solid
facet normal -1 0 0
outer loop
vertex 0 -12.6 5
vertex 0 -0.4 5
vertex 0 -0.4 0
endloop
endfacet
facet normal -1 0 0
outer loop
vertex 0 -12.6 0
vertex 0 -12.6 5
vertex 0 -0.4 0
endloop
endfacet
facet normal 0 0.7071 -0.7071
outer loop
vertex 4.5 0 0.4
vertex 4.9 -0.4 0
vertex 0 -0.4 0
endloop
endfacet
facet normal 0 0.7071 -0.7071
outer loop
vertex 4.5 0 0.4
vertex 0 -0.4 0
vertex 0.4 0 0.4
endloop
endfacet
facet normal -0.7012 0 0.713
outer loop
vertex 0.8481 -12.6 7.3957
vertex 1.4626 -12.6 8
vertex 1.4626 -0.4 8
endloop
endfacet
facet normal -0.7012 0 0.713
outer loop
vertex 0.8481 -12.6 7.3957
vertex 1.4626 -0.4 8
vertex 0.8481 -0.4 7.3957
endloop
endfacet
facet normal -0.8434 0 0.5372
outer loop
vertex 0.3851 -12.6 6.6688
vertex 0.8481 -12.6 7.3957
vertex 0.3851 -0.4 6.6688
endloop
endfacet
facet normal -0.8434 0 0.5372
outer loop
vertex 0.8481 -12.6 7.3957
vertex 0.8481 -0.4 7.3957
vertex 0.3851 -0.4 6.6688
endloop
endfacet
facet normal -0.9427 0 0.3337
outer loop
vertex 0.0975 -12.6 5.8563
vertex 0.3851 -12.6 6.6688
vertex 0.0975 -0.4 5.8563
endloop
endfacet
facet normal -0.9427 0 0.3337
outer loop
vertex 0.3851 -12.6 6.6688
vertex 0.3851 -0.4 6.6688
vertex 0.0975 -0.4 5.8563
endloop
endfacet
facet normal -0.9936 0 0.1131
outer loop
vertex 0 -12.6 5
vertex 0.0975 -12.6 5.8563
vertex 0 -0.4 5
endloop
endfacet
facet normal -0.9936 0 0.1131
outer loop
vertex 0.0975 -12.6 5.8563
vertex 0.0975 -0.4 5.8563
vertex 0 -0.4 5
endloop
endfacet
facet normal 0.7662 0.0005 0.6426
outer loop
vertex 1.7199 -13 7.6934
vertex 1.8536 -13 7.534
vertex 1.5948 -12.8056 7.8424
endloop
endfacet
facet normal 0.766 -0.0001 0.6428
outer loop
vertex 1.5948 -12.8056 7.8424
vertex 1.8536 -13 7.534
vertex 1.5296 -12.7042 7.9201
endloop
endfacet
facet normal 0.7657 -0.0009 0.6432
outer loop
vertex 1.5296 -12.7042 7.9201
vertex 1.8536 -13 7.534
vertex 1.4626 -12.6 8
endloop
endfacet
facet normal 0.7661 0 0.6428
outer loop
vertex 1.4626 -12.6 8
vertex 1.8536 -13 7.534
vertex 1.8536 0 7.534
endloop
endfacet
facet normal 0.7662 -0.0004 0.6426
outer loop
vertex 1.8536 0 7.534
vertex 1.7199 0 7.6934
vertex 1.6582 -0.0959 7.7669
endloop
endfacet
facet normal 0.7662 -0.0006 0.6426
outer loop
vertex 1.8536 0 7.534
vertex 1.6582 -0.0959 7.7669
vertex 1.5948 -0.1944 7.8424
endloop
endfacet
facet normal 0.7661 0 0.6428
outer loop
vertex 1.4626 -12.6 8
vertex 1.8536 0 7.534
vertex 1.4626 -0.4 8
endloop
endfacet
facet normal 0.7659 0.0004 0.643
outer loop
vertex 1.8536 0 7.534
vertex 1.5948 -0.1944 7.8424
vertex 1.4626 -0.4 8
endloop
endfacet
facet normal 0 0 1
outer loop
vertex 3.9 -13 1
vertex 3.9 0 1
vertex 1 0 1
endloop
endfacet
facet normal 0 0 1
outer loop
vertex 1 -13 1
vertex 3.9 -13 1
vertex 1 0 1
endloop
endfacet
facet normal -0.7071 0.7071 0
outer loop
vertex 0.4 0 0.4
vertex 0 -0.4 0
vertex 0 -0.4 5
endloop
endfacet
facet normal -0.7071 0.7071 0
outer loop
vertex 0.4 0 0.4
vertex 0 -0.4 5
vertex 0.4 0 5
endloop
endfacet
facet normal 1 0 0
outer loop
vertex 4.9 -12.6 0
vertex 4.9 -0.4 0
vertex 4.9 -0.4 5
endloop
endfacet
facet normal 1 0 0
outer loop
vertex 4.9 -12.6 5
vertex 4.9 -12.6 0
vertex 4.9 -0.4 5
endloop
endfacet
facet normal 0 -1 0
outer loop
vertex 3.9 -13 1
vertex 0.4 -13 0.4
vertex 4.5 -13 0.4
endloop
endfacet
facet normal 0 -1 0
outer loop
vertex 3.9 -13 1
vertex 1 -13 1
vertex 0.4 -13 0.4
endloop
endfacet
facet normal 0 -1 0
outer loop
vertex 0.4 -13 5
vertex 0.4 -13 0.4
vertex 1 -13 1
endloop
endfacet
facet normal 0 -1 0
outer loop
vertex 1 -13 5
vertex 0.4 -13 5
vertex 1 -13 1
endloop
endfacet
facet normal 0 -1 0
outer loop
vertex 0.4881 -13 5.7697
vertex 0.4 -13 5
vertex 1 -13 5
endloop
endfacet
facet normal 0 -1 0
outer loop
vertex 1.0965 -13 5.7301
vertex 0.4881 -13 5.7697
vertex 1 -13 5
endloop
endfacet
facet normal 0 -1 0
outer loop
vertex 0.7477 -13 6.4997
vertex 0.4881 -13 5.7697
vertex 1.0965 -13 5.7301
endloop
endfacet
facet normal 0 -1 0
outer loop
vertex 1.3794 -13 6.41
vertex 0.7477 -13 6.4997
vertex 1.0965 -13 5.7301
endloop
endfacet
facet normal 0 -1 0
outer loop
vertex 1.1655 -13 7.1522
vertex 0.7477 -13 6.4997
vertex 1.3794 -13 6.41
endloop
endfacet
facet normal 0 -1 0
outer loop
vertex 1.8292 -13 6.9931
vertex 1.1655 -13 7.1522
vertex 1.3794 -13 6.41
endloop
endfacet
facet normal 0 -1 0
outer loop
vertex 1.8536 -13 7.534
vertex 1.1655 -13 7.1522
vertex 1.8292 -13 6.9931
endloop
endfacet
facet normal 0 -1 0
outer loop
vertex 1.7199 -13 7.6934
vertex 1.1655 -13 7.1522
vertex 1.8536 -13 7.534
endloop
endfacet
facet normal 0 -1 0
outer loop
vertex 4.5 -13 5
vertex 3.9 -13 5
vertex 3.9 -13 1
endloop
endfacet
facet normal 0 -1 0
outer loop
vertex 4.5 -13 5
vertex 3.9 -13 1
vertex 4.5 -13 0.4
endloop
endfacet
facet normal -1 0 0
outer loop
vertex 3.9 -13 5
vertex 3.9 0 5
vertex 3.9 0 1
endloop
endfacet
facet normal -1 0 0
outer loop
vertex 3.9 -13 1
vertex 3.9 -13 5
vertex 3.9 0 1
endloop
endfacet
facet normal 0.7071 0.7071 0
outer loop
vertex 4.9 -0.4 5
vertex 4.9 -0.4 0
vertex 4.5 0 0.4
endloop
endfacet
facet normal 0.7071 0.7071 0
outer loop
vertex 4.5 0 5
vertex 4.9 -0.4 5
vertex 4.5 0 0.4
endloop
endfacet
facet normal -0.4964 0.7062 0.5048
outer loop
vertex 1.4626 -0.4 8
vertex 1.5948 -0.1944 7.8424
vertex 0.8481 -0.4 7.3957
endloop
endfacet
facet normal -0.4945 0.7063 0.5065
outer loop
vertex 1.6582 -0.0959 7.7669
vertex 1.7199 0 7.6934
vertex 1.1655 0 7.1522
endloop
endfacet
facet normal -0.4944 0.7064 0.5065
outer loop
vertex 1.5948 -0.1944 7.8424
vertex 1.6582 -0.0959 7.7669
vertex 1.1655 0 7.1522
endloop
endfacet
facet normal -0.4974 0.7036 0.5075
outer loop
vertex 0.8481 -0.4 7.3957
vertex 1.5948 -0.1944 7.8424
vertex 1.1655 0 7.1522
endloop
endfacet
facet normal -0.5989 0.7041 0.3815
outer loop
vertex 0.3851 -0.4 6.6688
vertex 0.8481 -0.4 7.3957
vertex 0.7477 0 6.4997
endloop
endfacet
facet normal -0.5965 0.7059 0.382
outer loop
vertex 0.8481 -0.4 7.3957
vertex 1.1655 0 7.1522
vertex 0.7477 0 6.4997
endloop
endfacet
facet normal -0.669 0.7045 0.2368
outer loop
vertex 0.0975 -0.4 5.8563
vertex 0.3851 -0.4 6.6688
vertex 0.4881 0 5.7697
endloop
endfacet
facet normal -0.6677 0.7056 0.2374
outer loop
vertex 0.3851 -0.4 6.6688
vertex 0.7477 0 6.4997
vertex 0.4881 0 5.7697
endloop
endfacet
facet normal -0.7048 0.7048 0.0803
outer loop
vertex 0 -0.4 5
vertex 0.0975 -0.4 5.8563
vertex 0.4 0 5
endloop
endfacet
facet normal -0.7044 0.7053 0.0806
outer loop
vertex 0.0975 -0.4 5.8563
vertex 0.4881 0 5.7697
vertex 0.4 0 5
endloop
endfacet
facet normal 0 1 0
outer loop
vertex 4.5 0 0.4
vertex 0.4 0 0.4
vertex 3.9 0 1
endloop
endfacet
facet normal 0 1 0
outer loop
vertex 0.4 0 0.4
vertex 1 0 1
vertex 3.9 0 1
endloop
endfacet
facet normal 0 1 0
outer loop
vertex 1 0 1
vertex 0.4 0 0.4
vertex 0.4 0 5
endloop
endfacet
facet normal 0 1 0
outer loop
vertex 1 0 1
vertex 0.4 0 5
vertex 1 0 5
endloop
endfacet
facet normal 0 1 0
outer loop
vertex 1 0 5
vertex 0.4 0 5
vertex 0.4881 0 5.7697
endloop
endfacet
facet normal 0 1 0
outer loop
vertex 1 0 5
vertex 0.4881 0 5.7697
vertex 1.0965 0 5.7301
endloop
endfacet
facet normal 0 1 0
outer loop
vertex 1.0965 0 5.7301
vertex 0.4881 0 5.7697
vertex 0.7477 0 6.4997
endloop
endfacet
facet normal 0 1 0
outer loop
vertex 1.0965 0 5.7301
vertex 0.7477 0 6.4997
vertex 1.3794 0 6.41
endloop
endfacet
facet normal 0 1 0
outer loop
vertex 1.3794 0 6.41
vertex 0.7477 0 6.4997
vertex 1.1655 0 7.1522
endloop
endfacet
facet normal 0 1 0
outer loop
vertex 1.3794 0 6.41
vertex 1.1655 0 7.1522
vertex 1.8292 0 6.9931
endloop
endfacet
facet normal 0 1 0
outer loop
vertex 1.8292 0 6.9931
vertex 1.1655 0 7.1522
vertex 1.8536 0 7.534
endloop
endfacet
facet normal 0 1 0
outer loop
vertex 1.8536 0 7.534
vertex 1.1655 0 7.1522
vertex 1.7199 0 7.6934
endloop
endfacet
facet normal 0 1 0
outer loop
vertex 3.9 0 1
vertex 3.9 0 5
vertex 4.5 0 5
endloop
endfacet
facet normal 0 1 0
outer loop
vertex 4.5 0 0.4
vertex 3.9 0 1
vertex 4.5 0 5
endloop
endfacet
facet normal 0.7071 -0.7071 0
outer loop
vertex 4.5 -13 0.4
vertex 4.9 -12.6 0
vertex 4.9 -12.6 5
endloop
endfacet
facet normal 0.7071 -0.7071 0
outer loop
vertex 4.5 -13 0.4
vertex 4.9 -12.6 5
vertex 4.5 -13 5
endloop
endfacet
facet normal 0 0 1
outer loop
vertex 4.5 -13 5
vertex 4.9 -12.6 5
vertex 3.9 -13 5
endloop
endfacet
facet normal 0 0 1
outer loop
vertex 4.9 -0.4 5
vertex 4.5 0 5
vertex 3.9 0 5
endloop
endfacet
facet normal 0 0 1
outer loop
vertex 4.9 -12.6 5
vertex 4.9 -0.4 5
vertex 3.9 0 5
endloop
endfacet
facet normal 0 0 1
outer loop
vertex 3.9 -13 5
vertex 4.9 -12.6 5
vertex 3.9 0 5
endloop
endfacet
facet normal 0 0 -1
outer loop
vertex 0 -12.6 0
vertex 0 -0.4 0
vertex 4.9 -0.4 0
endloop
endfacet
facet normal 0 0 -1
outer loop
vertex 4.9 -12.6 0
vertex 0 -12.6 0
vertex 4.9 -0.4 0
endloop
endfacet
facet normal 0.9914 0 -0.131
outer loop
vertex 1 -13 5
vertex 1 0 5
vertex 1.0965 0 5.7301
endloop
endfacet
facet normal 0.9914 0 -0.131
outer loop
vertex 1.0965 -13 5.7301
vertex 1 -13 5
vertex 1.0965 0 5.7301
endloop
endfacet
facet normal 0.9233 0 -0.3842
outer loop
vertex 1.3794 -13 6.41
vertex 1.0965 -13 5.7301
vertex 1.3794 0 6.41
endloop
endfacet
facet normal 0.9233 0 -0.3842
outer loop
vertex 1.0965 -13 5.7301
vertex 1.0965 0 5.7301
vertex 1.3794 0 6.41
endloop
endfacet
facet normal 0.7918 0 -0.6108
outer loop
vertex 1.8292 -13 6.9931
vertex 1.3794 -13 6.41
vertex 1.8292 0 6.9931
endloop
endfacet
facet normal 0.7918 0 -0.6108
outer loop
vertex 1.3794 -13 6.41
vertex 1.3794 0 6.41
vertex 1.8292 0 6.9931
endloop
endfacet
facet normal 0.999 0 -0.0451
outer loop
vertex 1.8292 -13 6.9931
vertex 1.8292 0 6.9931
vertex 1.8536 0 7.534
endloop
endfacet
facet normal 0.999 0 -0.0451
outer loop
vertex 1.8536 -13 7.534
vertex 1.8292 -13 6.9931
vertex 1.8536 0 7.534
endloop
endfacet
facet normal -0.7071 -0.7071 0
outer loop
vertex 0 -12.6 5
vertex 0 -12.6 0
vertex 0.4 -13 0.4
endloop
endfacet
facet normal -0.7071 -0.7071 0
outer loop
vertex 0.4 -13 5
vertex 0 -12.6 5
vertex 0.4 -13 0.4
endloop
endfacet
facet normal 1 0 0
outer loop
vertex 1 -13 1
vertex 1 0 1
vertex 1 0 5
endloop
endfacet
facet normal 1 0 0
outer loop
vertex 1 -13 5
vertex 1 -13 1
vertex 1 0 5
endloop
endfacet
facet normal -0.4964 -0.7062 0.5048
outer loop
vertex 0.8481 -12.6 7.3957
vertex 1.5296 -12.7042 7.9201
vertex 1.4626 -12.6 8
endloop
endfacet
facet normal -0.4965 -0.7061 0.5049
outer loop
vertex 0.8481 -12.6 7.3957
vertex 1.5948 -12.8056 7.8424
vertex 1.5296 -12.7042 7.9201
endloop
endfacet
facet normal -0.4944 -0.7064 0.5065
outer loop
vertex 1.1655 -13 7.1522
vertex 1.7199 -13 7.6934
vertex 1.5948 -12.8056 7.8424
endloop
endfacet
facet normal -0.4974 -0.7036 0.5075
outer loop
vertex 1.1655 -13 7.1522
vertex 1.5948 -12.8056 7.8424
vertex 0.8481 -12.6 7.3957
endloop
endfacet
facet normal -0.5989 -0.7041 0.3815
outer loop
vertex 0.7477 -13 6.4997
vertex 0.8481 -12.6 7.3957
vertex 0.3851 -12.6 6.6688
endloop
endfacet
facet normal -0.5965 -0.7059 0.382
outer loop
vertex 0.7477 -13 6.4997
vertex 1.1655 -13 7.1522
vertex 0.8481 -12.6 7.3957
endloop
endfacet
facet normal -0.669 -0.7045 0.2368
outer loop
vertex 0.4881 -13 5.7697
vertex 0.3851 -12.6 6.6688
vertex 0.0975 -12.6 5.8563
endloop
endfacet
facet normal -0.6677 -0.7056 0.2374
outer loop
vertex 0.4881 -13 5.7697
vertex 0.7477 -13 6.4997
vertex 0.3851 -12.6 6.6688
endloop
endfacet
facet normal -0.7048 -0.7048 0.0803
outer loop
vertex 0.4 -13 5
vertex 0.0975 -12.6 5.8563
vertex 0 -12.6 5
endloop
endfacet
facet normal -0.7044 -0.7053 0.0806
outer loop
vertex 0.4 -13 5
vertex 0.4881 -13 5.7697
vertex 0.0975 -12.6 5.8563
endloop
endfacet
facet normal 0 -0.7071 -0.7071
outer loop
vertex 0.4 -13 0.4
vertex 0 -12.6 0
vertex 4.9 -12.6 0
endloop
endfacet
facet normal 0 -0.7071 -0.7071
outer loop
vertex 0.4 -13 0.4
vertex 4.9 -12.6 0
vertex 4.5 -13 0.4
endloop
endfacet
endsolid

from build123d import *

# Parameters (mm, degrees)
F1_DEPTH     = 13
F2_T1_DEPTH  = 6.0286731952
F2_T3_DEPTH  = 15.0178646599
F2_T5_DEPTH  = 6.9573463904
F2_T7_DEPTH  = 7.0573463904
F2_T10_ANGLE = 67.461453667
F2_T12_ANGLE = 67.461453667


# Not quite as in the source:
# - a fillet or chamfer that OpenCascade refuses, or shapes differently, is made with other operations: its cross-section is extruded or revolved along the edge and cut away or added


with BuildPart() as f1:
    # F0 (on Front) → F1 (new body)
    with BuildSketch(Plane.XZ):
        with BuildLine():
            Line((0, 5), (0, 0))
            Line((0, 0), (4.9, 0))
            Line((4.9, 0), (4.9, 5))
            Line((4.9, 5), (3.9, 5))
            Line((3.9, 5), (3.9, 1))
            Line((3.9, 1), (1, 1))
            Line((1, 1), (1, 5))
            ThreePointArc((1, 5), (1.2914644914, 6.2462400161), (2.1053955316, 7.2339555569))
            Line((2.1053955316, 7.2339555569), (1.4626079219, 8))
            ThreePointArc((1.4626079219, 8), (0.3851271545, 6.6687736465), (0, 5))
        make_face()
    extrude(amount=F1_DEPTH)

    # F2: chamfer of 0.4 on 9 edges, made by hand

    # F2_s2 → F2_t1 (cut)
    with BuildSketch(Plane.XY.offset(-1.0286731952)):
        Polygon((0, -12.6), (0.4, -13), (0, -13), align=None)
        Polygon((0, -0.4), (0.4, 0), (0, 0), align=None)
    extrude(amount=F2_T1_DEPTH, mode=Mode.SUBTRACT)

    # F2_s4 → F2_t3 (cut)
    with BuildSketch(Plane.XZ.offset(-1.00893233)):
        with BuildLine():
            Line((1.8291984844, 6.9931446867), (1.8536490905, 7.5339752825))
            Line((1.8536490905, 7.5339752825), (2.1053955316, 7.2339555569))
            ThreePointArc((2.1053955316, 7.2339555569), (1.9591897538, 7.1144071406), (1.8291984844, 6.9931446867))
        make_face()
    extrude(amount=F2_T3_DEPTH, mode=Mode.SUBTRACT)

    # F2_s6 → F2_t5 (cut)
    with BuildSketch(Plane.YZ.offset(-1.0286731952)):
        Polygon((-0.4, 0), (0, 0.4), (0, 0), align=None)
        Polygon((-12.6, 0), (-13, 0.4), (-13, 0), align=None)
    extrude(amount=F2_T5_DEPTH, mode=Mode.SUBTRACT)

    # F2_s8 → F2_t7 (cut)
    with BuildSketch(Plane.XY.offset(-1.0286731952)):
        Polygon((4.9, -0.4), (4.5, 0), (4.9, 0), align=None)
        Polygon((4.9, -12.6), (4.5, -13), (4.9, -13), align=None)
    extrude(amount=F2_T7_DEPTH, mode=Mode.SUBTRACT)

    # F2_s9 → F2_t10 (revolve, cut)
    with BuildSketch(Plane(origin=(5.0186624957, 0, 2.0827548228), x_dir=(0, 1, 0), z_dir=(0.9236218692, 0, 0.3833048953))):
        Polygon((-0.4, 6.9664843046), (0, 6.5664843046), (0, 6.9664843046), align=None)
    revolve(axis=Axis((3.808, 0, 5), (0, -1, 0)), revolution_arc=F2_T10_ANGLE, mode=Mode.SUBTRACT)

    # F2_s11 → F2_t12 (revolve, cut)
    with BuildSketch(Plane(origin=(5.0186624957, 0, 2.0827548228), x_dir=(0, 1, 0), z_dir=(0.9236218692, 0, 0.3833048953))):
        Polygon((-12.6, 6.9664843046), (-13, 6.5664843046), (-13, 6.9664843046), align=None)
    revolve(axis=Axis((3.808, -13, 5), (0, -1, 0)), revolution_arc=F2_T12_ANGLE, mode=Mode.SUBTRACT)


solid = f1.part
